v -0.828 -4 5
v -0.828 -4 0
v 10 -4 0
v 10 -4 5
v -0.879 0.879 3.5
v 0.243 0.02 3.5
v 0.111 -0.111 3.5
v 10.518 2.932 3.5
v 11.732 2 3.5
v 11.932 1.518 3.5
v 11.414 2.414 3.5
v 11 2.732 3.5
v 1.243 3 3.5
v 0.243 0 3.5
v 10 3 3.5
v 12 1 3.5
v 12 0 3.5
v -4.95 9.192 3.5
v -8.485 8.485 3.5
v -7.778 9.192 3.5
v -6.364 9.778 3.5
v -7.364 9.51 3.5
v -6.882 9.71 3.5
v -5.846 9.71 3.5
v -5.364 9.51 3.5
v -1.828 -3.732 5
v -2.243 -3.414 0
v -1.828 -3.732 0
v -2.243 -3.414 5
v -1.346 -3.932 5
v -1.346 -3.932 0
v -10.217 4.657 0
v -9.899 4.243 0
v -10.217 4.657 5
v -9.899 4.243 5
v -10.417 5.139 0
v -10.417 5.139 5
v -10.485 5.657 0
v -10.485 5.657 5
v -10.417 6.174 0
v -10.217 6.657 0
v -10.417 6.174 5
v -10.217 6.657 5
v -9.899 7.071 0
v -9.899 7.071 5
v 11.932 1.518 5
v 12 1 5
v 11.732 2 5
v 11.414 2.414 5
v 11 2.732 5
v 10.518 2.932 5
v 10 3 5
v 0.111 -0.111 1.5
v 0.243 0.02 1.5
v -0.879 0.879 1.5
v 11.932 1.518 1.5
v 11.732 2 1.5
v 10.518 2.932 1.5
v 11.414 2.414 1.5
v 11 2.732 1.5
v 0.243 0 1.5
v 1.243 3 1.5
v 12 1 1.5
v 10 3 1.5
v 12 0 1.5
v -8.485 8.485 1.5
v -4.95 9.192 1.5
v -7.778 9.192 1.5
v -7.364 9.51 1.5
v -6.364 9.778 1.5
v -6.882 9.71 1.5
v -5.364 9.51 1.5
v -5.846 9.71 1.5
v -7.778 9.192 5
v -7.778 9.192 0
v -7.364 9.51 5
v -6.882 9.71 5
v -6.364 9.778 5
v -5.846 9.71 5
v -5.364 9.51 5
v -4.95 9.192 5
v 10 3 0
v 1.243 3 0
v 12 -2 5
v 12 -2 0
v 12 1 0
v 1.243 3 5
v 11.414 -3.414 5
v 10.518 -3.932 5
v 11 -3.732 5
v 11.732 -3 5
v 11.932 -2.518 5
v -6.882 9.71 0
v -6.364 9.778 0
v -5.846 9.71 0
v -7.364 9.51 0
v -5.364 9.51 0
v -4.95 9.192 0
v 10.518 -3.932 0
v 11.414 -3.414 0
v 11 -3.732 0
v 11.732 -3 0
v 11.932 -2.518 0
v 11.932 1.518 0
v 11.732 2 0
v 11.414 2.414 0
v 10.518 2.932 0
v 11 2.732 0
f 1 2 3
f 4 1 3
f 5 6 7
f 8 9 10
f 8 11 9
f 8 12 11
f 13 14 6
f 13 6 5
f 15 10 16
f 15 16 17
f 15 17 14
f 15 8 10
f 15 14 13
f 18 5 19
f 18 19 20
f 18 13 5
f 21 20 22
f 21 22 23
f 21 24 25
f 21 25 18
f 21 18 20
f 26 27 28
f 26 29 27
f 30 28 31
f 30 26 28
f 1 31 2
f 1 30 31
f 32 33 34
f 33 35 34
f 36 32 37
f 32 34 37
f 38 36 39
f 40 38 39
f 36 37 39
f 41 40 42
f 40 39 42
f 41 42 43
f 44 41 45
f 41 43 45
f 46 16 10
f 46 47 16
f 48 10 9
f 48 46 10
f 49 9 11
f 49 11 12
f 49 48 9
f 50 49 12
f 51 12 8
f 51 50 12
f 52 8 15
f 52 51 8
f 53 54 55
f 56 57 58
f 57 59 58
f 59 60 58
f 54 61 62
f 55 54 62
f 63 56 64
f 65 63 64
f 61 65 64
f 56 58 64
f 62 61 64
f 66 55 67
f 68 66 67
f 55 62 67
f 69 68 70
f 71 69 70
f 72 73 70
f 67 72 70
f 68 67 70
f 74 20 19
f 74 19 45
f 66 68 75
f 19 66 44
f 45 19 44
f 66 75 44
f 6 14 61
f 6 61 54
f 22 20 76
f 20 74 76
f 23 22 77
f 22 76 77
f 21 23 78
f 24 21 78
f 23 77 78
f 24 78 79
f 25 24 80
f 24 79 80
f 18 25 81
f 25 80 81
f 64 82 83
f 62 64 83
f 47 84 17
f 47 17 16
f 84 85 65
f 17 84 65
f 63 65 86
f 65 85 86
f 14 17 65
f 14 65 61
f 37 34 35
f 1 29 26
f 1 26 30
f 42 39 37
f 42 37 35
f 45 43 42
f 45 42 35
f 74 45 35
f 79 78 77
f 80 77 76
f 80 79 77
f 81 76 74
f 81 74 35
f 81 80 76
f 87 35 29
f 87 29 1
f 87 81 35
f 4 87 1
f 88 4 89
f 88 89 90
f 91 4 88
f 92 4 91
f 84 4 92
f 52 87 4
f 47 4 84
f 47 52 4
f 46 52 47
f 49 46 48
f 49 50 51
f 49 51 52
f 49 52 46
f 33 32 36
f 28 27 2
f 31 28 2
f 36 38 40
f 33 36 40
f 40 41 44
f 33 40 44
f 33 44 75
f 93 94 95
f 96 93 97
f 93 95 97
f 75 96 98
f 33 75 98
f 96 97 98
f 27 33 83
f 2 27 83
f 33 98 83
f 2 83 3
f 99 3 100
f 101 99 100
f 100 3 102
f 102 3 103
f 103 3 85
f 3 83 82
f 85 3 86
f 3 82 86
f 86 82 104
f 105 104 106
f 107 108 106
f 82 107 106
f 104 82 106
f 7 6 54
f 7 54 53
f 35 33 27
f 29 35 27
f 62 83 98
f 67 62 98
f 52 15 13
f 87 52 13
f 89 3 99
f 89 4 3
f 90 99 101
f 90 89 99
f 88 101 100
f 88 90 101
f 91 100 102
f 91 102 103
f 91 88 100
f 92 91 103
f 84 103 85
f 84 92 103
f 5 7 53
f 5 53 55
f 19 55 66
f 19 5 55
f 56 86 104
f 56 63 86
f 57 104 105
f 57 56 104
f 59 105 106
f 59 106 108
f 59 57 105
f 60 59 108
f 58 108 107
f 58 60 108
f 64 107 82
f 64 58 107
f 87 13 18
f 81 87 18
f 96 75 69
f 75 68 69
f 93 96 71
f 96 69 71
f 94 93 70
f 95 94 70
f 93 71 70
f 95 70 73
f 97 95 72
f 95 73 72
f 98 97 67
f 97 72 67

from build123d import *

# Parameters (mm, degrees)
F1_DEPTH = 5
F2_W     = 10.7573593129
F2_H     = 2
F3_DEPTH = 3
F4_W     = 10.7573593129
F4_H     = 2
F5_DEPTH = 3
F6_W     = 3
F6_H     = 2
F7_DEPTH = 1
F8_W     = 1.5857864376
F8_H     = 2
F9_DEPTH = 1.4
F10_R    = 2


with BuildPart() as f1:
    # F0 (on Top) → F1 (new body)
    with BuildSketch(Plane.XY):
        Polygon((-11.313708499, 5.6568542495), (-1.6568542495, -4), (12, -4), (12, 3), (1.2426406871, 3), (-6.3639610307, 10.6066017178), align=None)
    extrude(amount=F1_DEPTH)

    # F2 (on face) → F3 (cut)
    with BuildSketch(Plane(origin=(2.1213203436, 2.1213203436, 0), x_dir=(-0.7071067812, 0.7071067812, 0), z_dir=(0.7071067812, 0.7071067812, 0))):
        with Locations((6.6213203436, 2.5)):
            Rectangle(F2_W, F2_H)
    extrude(amount=-F3_DEPTH, mode=Mode.SUBTRACT)

    # F4 (on face) → F5 (cut)
    with BuildSketch(Plane(origin=(0, 3, 0), x_dir=(-1, 0, 0), z_dir=(0, 1, 0))):
        with Locations((-6.6213203436, 2.5)):
            Rectangle(F4_W, F4_H)
    extrude(amount=-F5_DEPTH, mode=Mode.SUBTRACT)

    # F6 (on face) → F7 (cut)
    with BuildSketch(Plane.YZ.offset(1.2426406871)):
        with Locations((1.5, 2.5)):
            Rectangle(F6_W, F6_H)
    extrude(amount=-F7_DEPTH, mode=Mode.SUBTRACT)

    # F8 (on face) → F9 (cut)
    with BuildSketch(Plane(origin=(-0.8786796564, 0.8786796564, 0), x_dir=(-0.7071067812, -0.7071067812, 0), z_dir=(-0.7071067812, 0.7071067812, 0))):
        with Locations((-0.7928932188, 2.5)):
            Rectangle(F8_W, F8_H)
    extrude(amount=-F9_DEPTH, mode=Mode.SUBTRACT)

    # F10
    f10_edges = [f1.edges().sort_by_distance(p)[0] for p in [
        (-1.656854, -4, 2.5),
        (-11.313708, 5.656854, 2.5),
        (12, -4, 2.5),
        (12, 3, 4.25),
        (12, 3, 0.75),
        (-6.363961, 10.606602, 4.25),
        (-6.363961, 10.606602, 0.75),
    ]]
    fillet(f10_edges, radius=F10_R)


solid = f1.part
